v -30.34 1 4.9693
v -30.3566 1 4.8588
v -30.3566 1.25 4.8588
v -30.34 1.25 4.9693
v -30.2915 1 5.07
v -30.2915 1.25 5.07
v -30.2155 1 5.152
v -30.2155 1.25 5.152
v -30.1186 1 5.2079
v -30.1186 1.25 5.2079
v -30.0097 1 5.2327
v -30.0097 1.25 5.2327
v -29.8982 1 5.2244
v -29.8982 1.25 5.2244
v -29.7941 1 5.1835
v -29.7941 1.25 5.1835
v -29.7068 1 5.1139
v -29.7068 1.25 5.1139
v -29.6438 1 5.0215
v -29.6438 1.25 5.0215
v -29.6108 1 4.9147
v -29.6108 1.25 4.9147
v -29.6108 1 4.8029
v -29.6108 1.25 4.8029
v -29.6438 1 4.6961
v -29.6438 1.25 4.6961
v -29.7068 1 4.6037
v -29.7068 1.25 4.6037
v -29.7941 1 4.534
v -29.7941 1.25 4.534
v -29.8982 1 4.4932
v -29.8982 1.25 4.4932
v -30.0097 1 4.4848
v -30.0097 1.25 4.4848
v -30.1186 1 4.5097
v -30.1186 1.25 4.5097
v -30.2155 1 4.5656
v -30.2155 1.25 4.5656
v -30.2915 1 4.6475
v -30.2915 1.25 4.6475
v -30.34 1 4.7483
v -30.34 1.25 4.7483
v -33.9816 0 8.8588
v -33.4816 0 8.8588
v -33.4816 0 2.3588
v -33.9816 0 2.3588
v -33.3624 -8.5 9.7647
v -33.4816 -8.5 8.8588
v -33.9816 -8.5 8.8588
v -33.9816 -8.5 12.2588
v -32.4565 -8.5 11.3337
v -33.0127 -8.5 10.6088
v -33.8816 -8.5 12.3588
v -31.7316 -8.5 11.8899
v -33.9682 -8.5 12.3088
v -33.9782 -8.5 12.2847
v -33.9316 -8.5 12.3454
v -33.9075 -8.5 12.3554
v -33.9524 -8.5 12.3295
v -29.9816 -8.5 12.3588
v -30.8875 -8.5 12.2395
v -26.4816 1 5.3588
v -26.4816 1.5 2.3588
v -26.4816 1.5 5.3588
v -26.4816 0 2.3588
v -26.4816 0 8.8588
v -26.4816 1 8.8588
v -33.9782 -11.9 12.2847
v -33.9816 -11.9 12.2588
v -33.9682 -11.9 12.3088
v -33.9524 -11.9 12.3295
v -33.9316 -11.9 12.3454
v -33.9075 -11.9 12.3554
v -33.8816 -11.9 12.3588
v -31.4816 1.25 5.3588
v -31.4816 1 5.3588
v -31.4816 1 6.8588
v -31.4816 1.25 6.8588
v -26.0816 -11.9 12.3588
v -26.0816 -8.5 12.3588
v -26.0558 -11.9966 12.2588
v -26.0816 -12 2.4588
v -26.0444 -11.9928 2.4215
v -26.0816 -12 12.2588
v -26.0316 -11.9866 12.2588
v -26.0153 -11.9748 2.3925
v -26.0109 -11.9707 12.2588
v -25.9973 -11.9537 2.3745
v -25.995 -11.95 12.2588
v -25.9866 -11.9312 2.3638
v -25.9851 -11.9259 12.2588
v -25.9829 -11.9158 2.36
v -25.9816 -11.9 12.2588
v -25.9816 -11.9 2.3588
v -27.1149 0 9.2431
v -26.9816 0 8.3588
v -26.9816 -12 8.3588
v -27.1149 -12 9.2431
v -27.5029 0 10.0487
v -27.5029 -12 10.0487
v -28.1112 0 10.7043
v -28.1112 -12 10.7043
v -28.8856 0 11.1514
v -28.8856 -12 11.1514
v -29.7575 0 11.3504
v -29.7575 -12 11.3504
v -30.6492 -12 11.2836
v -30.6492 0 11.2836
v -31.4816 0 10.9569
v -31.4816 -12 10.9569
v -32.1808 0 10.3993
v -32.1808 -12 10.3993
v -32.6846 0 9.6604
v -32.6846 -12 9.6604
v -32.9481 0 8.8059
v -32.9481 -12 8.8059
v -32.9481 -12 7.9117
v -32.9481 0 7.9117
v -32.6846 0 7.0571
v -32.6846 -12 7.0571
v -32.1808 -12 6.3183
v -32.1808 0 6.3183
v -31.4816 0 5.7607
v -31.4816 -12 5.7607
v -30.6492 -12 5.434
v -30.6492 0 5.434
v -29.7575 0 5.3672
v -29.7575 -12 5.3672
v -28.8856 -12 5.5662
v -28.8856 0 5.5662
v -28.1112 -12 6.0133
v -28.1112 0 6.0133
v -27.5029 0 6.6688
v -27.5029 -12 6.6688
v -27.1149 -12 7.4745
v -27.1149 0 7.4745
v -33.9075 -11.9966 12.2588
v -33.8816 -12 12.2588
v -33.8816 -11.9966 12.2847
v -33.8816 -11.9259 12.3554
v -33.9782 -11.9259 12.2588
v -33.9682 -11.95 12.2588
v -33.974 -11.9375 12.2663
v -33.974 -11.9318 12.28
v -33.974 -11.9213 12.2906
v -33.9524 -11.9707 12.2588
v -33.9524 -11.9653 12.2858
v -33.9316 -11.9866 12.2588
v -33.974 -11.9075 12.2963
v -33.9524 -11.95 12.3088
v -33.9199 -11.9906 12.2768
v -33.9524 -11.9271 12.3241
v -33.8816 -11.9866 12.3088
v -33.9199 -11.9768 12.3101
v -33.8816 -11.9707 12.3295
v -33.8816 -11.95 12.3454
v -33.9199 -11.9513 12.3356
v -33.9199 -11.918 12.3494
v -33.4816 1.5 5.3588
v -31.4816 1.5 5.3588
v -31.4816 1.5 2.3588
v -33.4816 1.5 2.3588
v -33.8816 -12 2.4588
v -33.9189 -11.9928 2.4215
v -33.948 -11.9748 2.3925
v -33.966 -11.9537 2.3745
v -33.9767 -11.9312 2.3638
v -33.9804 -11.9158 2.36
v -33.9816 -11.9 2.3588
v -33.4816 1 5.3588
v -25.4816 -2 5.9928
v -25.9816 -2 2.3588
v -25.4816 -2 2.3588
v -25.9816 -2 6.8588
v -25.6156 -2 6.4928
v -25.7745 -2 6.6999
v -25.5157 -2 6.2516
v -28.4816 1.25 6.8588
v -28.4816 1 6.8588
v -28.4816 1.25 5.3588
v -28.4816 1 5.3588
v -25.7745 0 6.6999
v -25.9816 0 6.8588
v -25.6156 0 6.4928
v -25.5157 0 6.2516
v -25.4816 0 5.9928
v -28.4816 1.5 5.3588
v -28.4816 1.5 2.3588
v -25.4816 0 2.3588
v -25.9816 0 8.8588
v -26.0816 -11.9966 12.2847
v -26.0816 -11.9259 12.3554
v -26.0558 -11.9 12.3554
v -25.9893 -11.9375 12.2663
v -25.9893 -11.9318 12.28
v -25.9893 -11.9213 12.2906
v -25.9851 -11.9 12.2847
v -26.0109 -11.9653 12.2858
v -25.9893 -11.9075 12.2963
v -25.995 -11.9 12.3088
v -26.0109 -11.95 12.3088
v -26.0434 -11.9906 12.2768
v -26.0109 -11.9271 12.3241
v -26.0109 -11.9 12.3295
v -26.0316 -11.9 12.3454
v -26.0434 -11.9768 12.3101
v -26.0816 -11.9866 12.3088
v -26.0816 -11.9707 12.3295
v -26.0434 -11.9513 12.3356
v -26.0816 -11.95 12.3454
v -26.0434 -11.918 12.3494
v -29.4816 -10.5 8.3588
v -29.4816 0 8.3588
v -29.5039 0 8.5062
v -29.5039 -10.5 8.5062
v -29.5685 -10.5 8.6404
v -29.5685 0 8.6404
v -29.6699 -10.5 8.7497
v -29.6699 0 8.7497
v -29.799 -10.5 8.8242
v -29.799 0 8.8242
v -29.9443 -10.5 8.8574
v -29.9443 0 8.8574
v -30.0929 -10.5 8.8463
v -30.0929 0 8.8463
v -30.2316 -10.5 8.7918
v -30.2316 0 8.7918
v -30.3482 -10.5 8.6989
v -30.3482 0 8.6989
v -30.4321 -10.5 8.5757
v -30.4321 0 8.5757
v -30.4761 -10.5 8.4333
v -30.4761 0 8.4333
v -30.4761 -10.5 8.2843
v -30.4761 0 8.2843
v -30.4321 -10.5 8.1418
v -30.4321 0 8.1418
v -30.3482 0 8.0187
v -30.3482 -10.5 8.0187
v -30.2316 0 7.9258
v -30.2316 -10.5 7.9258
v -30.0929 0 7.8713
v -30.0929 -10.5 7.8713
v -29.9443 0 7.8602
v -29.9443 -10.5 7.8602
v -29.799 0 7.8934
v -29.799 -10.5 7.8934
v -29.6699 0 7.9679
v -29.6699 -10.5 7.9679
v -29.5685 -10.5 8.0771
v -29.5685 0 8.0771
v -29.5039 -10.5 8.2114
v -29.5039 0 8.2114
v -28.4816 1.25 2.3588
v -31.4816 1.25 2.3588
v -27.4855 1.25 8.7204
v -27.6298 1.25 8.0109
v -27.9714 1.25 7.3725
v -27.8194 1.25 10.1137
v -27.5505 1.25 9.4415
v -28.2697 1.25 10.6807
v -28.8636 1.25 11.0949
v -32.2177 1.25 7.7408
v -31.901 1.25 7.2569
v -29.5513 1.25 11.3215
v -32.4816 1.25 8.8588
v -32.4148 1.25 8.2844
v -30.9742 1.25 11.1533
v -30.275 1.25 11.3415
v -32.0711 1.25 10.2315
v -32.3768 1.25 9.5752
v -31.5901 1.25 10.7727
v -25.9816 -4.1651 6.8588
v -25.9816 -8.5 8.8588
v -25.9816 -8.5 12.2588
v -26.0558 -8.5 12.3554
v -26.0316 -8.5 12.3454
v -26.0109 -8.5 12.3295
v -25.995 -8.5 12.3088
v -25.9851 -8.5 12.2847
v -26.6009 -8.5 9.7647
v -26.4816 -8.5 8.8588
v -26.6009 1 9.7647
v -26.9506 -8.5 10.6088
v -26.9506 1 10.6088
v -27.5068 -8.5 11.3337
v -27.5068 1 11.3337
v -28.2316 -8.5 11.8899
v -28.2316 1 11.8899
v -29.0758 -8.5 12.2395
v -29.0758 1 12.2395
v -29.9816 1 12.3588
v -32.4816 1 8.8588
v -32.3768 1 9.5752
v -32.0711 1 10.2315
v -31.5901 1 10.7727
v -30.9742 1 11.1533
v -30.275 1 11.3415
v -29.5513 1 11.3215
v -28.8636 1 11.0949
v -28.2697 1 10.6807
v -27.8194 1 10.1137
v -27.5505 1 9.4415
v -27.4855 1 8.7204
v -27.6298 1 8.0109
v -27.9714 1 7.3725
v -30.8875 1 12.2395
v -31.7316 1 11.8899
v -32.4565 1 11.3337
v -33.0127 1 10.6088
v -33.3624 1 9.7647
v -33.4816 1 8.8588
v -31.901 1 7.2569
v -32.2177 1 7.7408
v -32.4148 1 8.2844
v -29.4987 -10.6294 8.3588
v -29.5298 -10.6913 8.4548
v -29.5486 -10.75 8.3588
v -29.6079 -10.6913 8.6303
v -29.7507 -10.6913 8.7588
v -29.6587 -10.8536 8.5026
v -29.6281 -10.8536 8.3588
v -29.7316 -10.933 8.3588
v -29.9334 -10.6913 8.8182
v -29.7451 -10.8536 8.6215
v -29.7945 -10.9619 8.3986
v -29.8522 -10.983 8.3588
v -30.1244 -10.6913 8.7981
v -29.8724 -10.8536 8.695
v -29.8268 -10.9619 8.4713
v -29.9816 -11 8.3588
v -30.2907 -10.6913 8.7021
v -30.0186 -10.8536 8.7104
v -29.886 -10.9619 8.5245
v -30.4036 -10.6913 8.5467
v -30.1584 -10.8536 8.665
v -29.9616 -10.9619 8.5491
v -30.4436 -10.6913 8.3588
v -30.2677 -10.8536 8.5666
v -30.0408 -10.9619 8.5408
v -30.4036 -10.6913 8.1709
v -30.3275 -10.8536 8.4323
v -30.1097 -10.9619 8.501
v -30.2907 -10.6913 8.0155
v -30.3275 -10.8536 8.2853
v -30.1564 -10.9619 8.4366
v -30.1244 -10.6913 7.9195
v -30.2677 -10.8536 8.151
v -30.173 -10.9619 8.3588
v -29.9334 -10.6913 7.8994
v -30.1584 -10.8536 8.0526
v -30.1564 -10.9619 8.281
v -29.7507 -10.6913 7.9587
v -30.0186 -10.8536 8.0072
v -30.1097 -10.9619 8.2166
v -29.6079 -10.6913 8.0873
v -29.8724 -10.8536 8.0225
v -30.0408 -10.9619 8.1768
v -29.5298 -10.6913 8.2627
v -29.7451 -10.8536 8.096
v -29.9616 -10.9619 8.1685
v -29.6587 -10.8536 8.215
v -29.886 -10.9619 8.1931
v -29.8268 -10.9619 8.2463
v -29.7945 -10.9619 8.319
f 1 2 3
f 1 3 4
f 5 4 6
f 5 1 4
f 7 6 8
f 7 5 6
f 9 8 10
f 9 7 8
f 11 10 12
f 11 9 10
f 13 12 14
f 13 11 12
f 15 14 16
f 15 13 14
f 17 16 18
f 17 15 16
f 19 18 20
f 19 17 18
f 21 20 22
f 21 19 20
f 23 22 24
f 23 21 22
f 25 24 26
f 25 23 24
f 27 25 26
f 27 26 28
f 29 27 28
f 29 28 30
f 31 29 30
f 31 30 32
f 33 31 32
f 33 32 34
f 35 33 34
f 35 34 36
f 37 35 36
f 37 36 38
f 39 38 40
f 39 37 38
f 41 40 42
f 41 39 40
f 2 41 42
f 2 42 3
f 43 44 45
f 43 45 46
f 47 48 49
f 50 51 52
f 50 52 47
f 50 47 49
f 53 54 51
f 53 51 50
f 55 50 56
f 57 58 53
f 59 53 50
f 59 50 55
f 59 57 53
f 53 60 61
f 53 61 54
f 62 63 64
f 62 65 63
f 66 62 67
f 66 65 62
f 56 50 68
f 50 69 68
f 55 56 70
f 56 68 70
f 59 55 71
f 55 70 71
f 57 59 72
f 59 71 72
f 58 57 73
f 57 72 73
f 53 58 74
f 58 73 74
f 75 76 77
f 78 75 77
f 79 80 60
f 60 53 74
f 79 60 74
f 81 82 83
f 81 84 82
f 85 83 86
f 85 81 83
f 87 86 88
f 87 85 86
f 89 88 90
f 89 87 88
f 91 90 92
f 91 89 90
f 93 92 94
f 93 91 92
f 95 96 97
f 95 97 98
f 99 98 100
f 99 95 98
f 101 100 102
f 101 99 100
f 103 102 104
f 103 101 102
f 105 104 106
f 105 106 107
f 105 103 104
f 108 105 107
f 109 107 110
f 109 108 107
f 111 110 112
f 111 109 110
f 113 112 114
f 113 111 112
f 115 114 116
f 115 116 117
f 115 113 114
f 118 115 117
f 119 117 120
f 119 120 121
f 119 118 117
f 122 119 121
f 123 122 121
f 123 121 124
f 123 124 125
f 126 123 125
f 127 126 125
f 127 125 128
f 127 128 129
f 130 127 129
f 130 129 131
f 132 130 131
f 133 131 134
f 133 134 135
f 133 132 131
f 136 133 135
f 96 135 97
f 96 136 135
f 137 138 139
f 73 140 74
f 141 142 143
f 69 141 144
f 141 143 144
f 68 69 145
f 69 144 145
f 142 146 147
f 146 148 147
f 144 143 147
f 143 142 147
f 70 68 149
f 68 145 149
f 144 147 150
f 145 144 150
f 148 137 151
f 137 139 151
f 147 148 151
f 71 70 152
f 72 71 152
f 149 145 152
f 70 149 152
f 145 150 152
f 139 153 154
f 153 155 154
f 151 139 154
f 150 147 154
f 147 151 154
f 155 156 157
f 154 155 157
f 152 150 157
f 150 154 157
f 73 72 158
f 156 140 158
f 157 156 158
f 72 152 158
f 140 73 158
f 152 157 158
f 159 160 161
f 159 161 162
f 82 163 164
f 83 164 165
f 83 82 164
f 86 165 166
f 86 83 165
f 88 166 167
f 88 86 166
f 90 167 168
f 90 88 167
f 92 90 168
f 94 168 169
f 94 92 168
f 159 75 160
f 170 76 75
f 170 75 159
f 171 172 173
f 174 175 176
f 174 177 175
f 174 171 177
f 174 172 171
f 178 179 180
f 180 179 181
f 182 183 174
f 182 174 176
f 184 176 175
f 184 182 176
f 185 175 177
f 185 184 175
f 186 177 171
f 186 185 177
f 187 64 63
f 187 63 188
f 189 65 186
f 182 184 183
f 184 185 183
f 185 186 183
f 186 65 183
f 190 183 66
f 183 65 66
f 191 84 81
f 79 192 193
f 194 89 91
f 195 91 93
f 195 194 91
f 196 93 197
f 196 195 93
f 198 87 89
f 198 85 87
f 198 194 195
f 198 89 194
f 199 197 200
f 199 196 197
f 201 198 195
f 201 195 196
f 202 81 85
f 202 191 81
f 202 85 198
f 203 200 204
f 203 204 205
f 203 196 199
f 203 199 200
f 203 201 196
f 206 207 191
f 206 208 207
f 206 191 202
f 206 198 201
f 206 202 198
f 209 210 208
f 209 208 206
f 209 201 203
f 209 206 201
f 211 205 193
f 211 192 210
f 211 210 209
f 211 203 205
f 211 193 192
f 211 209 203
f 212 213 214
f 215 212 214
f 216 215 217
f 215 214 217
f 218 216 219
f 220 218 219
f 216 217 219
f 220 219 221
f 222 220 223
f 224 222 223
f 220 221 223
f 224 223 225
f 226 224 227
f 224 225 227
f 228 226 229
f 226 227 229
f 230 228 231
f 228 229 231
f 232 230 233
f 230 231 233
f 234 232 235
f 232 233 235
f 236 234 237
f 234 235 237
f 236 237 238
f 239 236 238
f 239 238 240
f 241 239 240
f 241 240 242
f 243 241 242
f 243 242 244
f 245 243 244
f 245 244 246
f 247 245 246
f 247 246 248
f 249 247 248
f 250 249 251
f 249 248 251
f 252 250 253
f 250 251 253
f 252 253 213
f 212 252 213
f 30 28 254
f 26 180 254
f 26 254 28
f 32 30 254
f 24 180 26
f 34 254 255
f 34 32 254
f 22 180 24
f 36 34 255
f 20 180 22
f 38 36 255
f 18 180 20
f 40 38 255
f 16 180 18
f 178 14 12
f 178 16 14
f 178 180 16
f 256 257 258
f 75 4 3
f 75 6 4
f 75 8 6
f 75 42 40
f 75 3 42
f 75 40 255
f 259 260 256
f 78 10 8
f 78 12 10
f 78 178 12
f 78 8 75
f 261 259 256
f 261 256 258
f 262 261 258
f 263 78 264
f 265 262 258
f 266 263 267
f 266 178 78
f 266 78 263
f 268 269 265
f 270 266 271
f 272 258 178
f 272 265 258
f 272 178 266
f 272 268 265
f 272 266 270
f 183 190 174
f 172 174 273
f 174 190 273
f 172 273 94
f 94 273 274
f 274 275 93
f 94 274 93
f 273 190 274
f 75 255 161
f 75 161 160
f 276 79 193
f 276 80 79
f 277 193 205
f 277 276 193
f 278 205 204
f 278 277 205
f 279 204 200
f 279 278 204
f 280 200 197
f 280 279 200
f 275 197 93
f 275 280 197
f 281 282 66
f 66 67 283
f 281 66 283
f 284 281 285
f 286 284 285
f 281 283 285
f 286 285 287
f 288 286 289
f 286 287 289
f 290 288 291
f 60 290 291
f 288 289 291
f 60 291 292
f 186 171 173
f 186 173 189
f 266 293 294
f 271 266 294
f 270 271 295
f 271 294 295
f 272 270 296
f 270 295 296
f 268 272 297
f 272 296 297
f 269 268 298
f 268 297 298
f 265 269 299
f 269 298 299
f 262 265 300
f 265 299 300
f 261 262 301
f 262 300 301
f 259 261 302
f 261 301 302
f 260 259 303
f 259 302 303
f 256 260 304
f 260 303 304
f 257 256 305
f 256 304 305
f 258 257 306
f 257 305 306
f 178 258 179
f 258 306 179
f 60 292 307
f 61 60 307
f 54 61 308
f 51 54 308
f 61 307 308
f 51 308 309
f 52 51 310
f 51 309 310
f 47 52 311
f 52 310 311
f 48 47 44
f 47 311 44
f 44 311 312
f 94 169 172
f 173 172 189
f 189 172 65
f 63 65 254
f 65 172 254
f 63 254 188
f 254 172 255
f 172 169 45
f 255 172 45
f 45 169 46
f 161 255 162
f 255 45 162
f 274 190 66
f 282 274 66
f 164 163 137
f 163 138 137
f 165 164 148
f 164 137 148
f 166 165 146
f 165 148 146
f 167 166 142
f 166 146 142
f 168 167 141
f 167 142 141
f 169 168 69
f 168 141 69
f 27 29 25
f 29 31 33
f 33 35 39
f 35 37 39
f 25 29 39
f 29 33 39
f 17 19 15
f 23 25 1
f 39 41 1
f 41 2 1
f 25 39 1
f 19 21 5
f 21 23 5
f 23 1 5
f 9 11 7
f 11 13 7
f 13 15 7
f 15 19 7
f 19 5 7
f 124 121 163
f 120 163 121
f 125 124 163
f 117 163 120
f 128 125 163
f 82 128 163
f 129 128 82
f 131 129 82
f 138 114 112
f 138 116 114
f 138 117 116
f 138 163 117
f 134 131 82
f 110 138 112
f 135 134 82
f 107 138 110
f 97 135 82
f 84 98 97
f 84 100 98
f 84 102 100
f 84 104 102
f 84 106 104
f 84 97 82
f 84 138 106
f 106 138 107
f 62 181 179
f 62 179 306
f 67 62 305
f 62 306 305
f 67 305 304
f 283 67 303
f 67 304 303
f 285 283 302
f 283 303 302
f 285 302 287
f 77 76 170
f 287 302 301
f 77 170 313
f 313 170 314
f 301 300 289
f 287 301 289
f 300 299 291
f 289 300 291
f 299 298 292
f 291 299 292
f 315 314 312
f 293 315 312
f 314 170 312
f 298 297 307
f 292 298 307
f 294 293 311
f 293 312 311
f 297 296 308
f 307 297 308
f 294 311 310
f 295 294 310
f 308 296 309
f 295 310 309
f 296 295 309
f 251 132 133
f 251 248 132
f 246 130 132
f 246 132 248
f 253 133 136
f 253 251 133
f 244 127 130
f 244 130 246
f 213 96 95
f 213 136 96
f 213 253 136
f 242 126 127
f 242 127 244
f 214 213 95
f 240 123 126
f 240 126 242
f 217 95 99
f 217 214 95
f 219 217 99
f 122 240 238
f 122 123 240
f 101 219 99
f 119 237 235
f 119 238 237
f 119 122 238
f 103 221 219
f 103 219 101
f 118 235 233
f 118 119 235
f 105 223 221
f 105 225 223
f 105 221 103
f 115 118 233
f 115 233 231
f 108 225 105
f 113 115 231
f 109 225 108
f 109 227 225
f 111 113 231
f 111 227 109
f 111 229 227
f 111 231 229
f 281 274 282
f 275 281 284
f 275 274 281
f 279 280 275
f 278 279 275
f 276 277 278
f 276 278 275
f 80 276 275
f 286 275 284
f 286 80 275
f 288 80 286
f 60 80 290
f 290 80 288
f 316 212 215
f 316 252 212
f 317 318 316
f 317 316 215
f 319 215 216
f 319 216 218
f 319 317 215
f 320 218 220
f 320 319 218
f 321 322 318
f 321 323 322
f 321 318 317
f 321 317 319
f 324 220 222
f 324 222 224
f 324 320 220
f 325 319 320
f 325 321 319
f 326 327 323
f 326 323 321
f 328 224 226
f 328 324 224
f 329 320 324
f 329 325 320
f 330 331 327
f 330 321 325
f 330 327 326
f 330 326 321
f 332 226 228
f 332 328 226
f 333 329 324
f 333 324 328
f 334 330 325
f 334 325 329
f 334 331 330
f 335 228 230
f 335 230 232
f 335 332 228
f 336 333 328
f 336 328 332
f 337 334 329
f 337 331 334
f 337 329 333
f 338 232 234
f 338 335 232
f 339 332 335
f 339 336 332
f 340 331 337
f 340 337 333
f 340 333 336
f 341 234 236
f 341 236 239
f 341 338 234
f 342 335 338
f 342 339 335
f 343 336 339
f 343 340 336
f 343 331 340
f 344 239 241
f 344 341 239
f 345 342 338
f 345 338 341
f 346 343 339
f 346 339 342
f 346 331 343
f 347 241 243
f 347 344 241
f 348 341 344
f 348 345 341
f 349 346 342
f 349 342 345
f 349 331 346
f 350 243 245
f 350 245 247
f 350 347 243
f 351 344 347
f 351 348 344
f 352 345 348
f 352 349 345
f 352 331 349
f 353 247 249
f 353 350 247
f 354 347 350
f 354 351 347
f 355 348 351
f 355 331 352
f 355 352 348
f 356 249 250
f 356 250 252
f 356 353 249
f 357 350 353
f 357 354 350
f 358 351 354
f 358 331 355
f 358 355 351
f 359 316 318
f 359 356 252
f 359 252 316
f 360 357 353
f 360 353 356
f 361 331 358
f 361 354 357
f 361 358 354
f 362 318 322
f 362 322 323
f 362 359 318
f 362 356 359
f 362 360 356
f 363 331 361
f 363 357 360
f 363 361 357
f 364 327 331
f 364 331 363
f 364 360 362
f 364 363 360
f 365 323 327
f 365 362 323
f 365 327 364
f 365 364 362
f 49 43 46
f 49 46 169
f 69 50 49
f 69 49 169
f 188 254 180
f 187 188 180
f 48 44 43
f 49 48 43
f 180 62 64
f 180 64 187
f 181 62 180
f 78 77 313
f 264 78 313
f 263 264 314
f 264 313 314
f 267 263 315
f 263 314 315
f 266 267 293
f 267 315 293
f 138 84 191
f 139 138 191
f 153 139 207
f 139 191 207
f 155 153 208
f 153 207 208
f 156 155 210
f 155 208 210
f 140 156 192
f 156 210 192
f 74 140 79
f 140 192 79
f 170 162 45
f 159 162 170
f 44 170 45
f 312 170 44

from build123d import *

# Parameters (mm, degrees)
F0_W         = 8
F0_H         = 10
F0_R         = 3
F1_DEPTH     = 12
F2_W         = 1
F2_H         = 10
F3_DEPTH     = 8
F5_DEPTH     = 9.5
F4_W         = 0.5
F4_H         = 6.5
F6_DEPTH     = 1
F7_R         = 0.5
F8_DEPTH     = 11
F9_R         = 0.5
F10_R        = 0.1
F11_W        = 2
F11_H        = 3
F12_DEPTH    = 0.5
F13_R        = 0.375
F14_DEPTH    = 0.25
F15_W        = 2
F15_H        = 4.5
F16_DEPTH    = 0.5
F17_T1_DEPTH = 6.3301270189


# Not quite as in the source:
# - a fillet or chamfer that OpenCascade refuses, or shapes differently, is made with other operations: its cross-section is extruded or revolved along the edge and cut away or added


with BuildPart() as f1:
    # F0 (on Front) → F1 (new body)
    with BuildSketch(Plane.XZ):
        with Locations((-29.9816446145, 7.3587873485)):
            Rectangle(F0_W, F0_H)
        with Locations((-29.9816446145, 8.3587873485)):
            Circle(F0_R, mode=Mode.SUBTRACT)
    extrude(amount=F1_DEPTH)

    # F2 (on face) → F3 (join, through all)
    with BuildSketch(Plane(origin=(-33.9816446145, 0, 0), x_dir=(0, -1, 0), z_dir=(-1, 0, 0))):
        with Locations((-0.5, 7.3587873485)):
            Rectangle(F2_W, F2_H)
    extrude(amount=-F3_DEPTH)

    # F4 (on face) → F5 (cut)
    with BuildSketch(Plane(origin=(0, 1, 0), x_dir=(-1, 0, 0), z_dir=(0, 1, 0))):
        with BuildLine():
            Line((33.9816446145, 12.3587873485), (29.9816446145, 12.3587873485))
            ThreePointArc((29.9816446145, 12.3587873485), (32.4565183487, 11.3336610826), (33.4816446145, 8.8587873485))
            Line((33.4816446145, 8.8587873485), (33.9816446145, 8.8587873485))
            Line((33.9816446145, 8.8587873485), (33.9816446145, 12.3587873485))
        make_face()
        with BuildLine():
            Line((29.9816446145, 12.3587873485), (25.9816446145, 12.3587873485))
            Line((25.9816446145, 12.3587873485), (25.9816446145, 8.8587873485))
            Line((25.9816446145, 8.8587873485), (26.4816446145, 8.8587873485))
            ThreePointArc((26.4816446145, 8.8587873485), (27.5067708804, 11.3336610826), (29.9816446145, 12.3587873485))
        make_face()
    extrude(amount=-F5_DEPTH, mode=Mode.SUBTRACT)

    # F4 (on face) → F6 (cut)
    with BuildSketch(Plane(origin=(0, 1, 0), x_dir=(-1, 0, 0), z_dir=(0, 1, 0))):
        with Locations((26.2316446145, 5.6087873485)):
            Rectangle(F4_W, F4_H)
        with Locations((33.7316446145, 5.6087873485)):
            Rectangle(F4_W, F4_H)
    extrude(amount=-F6_DEPTH, mode=Mode.SUBTRACT)

    # F7 (on face) → F8 (join)
    with BuildSketch(Plane.XZ):
        with Locations((-29.9816446145, 8.3587873485)):
            Circle(F7_R)
    extrude(amount=F8_DEPTH)

    # F9
    f9_edges = [f1.edges().sort_by_distance(p)[0] for p in [
        (-30.481645, -11, 8.358787),
    ]]
    fillet(f9_edges, radius=F9_R)

    # F10
    f10_edges = [f1.edges().sort_by_distance(p)[0] for p in [
        (-29.981645, -12, 12.358787),
        (-25.981645, -12, 7.358787),
        (-33.981645, -12, 7.358787),
        (-29.981645, -12, 2.358787),
        (-25.981645, -10.25, 12.358787),
        (-33.981645, -10.25, 12.358787),
    ]]
    fillet(f10_edges, radius=F10_R)

    # F11 (on face) → F12 (join)
    with BuildSketch(Plane(origin=(0, 1, 0), x_dir=(-1, 0, 0), z_dir=(0, 1, 0))):
        with Locations((27.4816446145, 3.8587873485)):
            Rectangle(F11_W, F11_H)
        with Locations((32.4816446145, 3.8587873485)):
            Rectangle(F11_W, F11_H)
    extrude(amount=F12_DEPTH)

    # F13 (on face) → F14 (join)
    with BuildSketch(Plane(origin=(0, 1, 0), x_dir=(-1, 0, 0), z_dir=(0, 1, 0))):
        with BuildLine():
            Line((31.4816446145, 6.8587873485), (28.4816446145, 6.8587873485))
            ThreePointArc((28.4816446145, 6.8587873485), (29.9816446145, 6.3587873485), (31.4816446145, 6.8587873485))
        make_face()
        with BuildLine():
            ThreePointArc((31.4816446145, 6.8587873485), (32.217712592, 7.7407533597), (32.4816446145, 8.8587873485))
            ThreePointArc((32.4816446145, 8.8587873485), (28.8636106257, 11.094855326), (28.4816446145, 6.8587873485))
            Line((28.4816446145, 6.8587873485), (31.4816446145, 6.8587873485))
        make_face()
        with BuildLine():
            ThreePointArc((31.4816446145, 6.8587873485), (29.9816446145, 6.3587873485), (28.4816446145, 6.8587873485))
            Line((28.4816446145, 6.8587873485), (28.4816446145, 5.3587873485))
            Line((28.4816446145, 5.3587873485), (28.4816446145, 2.3587873485))
            Line((28.4816446145, 2.3587873485), (31.4816446145, 2.3587873485))
            Line((31.4816446145, 2.3587873485), (31.4816446145, 5.3587873485))
            Line((31.4816446145, 5.3587873485), (31.4816446145, 6.8587873485))
        make_face()
        with Locations((29.9816446145, 4.8587873485)):
            Circle(F13_R, mode=Mode.SUBTRACT)
    extrude(amount=F14_DEPTH)

    # F15 (on face) → F16 (join)
    with BuildSketch(Plane.YZ.offset(-25.9816446145)):
        with Locations((-1, 4.6087873485)):
            Rectangle(F15_W, F15_H)
    extrude(amount=F16_DEPTH)

    # F17: fillet of radius 1 on 1 edges, made by hand

    # F17_s2 → F17_t1 (cut)
    with BuildSketch(Plane.XZ.offset(-2.1650635095)):
        with BuildLine():
            ThreePointArc((-25.9816446145, 6.8587873485), (-25.6156192107, 6.4927619447), (-25.4816446145, 5.9927619447))
            Line((-25.4816446145, 5.9927619447), (-25.4816446145, 6.8587873485))
            Line((-25.4816446145, 6.8587873485), (-25.9816446145, 6.8587873485))
        make_face()
    extrude(amount=F17_T1_DEPTH, mode=Mode.SUBTRACT)


solid = f1.part
